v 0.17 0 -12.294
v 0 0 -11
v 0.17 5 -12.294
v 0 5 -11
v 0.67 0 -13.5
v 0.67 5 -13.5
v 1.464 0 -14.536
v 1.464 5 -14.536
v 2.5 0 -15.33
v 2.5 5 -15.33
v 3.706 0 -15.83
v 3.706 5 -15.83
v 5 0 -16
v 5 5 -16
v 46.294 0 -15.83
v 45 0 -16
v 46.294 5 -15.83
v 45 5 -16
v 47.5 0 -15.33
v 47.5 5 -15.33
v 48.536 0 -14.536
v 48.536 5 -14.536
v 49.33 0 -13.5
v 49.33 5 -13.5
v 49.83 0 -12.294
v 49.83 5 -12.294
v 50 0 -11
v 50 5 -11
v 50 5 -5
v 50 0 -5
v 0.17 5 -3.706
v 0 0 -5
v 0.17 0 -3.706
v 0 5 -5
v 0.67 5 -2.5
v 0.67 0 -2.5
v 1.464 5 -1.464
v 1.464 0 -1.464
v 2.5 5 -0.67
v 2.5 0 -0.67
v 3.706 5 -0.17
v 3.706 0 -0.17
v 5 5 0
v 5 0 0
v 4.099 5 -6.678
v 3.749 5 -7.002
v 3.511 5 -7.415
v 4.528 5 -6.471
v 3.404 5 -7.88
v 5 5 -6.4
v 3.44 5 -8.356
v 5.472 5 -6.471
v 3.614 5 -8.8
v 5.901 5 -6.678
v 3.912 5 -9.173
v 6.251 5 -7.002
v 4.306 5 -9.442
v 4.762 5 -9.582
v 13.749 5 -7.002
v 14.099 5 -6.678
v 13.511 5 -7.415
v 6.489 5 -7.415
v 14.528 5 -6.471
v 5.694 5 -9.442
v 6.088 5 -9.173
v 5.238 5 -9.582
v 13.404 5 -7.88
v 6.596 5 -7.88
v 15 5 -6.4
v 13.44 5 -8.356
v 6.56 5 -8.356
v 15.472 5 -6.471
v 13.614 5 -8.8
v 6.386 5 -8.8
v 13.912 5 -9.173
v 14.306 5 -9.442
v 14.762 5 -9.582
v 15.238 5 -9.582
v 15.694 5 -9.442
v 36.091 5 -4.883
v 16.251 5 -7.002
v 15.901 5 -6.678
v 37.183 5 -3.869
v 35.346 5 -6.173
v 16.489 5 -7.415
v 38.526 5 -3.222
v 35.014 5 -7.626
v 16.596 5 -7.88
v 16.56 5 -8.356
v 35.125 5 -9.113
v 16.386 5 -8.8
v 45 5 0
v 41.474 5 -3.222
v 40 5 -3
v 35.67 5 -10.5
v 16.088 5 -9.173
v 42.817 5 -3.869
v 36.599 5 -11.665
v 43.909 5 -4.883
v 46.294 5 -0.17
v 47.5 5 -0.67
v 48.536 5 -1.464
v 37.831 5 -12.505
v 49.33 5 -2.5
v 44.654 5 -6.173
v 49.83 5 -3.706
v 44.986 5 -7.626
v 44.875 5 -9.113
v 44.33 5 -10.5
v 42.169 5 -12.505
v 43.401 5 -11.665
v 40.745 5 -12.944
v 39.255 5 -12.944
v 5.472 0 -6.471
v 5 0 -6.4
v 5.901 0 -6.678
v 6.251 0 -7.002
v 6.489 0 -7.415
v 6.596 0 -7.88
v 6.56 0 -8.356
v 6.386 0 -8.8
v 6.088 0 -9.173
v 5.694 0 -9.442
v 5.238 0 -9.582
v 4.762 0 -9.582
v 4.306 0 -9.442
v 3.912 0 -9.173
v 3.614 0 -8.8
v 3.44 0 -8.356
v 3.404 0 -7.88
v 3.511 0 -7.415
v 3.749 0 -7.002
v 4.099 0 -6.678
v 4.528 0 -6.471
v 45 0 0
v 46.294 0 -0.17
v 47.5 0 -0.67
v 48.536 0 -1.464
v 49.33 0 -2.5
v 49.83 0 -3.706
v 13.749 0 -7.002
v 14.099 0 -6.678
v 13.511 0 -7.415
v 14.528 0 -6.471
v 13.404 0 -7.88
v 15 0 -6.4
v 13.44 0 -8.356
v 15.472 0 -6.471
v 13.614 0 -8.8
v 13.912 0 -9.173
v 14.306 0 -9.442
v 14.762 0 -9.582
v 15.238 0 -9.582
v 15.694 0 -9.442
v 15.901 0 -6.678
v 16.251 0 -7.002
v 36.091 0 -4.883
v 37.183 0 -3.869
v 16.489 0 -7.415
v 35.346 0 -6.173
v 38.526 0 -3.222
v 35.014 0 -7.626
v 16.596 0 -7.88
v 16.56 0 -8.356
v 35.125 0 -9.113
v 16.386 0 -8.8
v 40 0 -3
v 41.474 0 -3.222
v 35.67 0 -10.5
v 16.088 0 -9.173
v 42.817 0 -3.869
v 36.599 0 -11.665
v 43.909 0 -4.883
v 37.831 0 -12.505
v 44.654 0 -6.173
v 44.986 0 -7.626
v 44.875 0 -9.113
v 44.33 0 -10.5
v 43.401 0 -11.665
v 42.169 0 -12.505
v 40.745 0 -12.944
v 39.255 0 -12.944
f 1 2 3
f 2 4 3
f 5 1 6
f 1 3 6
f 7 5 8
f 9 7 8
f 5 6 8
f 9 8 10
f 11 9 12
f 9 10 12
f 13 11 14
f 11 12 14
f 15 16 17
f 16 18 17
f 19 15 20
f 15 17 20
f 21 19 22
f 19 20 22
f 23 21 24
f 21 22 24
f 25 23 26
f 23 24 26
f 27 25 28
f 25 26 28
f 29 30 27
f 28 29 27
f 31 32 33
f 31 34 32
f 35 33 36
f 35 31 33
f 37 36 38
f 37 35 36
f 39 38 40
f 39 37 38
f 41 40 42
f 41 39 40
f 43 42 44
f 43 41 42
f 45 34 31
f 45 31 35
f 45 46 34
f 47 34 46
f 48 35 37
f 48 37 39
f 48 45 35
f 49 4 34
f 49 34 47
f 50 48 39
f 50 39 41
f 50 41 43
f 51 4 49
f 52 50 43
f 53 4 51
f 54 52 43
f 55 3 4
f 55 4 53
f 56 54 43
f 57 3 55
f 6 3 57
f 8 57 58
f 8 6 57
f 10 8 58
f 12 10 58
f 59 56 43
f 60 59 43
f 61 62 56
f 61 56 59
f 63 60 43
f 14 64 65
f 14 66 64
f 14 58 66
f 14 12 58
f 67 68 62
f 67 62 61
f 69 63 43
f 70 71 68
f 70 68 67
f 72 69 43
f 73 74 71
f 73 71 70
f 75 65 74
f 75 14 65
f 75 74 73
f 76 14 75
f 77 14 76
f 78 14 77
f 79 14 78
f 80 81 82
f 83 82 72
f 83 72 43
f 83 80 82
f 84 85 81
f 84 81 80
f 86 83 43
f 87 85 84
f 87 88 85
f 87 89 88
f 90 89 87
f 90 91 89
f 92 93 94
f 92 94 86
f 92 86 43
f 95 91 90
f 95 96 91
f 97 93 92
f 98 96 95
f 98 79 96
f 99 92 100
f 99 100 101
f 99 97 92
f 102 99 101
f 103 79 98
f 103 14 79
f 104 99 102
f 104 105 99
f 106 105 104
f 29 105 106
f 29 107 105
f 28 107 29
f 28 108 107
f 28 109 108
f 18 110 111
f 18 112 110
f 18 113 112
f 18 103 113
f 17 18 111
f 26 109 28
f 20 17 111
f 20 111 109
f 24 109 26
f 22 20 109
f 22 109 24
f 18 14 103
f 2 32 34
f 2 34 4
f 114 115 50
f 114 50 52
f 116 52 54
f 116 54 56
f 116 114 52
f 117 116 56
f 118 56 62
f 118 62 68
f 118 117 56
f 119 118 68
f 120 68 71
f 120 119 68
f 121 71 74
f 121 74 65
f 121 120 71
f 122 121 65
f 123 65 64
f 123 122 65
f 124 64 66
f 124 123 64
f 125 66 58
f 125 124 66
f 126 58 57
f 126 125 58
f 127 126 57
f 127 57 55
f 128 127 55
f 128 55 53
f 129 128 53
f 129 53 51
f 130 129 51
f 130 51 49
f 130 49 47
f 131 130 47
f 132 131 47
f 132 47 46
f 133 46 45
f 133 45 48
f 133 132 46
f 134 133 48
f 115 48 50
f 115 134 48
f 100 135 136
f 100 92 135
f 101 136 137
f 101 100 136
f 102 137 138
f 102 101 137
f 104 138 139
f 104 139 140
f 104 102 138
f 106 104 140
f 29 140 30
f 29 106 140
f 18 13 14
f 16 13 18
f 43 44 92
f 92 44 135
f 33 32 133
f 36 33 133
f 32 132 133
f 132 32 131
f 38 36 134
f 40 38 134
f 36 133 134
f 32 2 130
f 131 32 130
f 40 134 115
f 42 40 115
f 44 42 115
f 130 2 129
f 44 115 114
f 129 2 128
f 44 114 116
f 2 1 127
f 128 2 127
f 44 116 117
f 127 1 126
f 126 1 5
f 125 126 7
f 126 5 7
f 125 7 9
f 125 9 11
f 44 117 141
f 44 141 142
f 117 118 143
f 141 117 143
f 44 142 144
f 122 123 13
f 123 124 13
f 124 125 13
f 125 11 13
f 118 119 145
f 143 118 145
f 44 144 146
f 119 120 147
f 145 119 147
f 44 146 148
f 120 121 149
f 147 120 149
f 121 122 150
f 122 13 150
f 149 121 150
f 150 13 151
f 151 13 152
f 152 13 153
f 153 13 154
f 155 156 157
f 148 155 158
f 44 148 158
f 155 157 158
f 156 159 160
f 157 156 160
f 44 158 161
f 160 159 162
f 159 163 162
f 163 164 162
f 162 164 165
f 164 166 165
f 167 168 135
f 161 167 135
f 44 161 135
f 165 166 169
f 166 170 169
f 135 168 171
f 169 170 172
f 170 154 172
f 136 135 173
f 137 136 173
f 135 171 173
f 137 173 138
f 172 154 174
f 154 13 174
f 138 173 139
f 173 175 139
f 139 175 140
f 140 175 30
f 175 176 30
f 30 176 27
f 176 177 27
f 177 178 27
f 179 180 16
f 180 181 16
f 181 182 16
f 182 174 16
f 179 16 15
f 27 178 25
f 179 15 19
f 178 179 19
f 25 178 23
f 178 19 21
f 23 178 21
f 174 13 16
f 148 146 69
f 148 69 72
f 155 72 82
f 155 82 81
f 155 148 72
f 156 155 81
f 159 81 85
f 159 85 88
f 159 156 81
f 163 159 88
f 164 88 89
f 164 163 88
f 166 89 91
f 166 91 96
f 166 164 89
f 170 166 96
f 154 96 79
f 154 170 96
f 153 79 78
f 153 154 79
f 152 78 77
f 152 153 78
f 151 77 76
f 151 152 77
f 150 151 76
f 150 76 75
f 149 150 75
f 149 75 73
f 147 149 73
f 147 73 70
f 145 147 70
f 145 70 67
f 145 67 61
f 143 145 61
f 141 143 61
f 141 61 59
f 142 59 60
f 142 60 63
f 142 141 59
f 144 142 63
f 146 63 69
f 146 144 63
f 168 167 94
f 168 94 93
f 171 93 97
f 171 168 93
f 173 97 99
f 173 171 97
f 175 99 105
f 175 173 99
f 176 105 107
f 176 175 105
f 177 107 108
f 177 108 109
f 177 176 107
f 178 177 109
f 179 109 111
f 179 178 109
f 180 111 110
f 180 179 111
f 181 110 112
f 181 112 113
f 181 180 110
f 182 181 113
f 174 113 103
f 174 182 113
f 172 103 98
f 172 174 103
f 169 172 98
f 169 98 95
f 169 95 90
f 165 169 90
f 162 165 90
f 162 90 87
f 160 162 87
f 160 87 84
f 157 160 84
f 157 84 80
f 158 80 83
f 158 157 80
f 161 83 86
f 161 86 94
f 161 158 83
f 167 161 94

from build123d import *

# Parameters (mm, degrees)
SKETCH1_W           = 50
SKETCH1_H           = 16
SKETCH1_R           = 5
SKETCH1_R_2         = 1.6
BOSS_EXTRUDE1_DEPTH = 5
FILLET1_R           = 5


with BuildPart() as part:
    # Sketch1 → Boss-Extrude1 (new body)
    with BuildSketch(Plane(origin=(0, 0, 0), x_dir=(1, 0, 0), z_dir=(0, 1, 0))):
        with Locations((25, 8)):
            Rectangle(SKETCH1_W, SKETCH1_H)
        with Locations(Location((40, 8, 0), (0, 0, 270))):
            Circle(SKETCH1_R, mode=Mode.SUBTRACT)
        with Locations(Location((5, 8, 0), (0, 0, 270))):
            Circle(SKETCH1_R_2, mode=Mode.SUBTRACT)
        with Locations(Location((15, 8, 0), (0, 0, 270))):
            Circle(SKETCH1_R_2, mode=Mode.SUBTRACT)
    extrude(amount=BOSS_EXTRUDE1_DEPTH)

    # Fillet1
    fillet1_edges = [part.edges().sort_by_distance(p)[0] for p in [
        (0, 2.5, -16),
        (50, 2.5, -16),
        (50, 2.5, 0),
        (0, 2.5, 0),
    ]]
    fillet(fillet1_edges, radius=FILLET1_R)


solid = part.part
